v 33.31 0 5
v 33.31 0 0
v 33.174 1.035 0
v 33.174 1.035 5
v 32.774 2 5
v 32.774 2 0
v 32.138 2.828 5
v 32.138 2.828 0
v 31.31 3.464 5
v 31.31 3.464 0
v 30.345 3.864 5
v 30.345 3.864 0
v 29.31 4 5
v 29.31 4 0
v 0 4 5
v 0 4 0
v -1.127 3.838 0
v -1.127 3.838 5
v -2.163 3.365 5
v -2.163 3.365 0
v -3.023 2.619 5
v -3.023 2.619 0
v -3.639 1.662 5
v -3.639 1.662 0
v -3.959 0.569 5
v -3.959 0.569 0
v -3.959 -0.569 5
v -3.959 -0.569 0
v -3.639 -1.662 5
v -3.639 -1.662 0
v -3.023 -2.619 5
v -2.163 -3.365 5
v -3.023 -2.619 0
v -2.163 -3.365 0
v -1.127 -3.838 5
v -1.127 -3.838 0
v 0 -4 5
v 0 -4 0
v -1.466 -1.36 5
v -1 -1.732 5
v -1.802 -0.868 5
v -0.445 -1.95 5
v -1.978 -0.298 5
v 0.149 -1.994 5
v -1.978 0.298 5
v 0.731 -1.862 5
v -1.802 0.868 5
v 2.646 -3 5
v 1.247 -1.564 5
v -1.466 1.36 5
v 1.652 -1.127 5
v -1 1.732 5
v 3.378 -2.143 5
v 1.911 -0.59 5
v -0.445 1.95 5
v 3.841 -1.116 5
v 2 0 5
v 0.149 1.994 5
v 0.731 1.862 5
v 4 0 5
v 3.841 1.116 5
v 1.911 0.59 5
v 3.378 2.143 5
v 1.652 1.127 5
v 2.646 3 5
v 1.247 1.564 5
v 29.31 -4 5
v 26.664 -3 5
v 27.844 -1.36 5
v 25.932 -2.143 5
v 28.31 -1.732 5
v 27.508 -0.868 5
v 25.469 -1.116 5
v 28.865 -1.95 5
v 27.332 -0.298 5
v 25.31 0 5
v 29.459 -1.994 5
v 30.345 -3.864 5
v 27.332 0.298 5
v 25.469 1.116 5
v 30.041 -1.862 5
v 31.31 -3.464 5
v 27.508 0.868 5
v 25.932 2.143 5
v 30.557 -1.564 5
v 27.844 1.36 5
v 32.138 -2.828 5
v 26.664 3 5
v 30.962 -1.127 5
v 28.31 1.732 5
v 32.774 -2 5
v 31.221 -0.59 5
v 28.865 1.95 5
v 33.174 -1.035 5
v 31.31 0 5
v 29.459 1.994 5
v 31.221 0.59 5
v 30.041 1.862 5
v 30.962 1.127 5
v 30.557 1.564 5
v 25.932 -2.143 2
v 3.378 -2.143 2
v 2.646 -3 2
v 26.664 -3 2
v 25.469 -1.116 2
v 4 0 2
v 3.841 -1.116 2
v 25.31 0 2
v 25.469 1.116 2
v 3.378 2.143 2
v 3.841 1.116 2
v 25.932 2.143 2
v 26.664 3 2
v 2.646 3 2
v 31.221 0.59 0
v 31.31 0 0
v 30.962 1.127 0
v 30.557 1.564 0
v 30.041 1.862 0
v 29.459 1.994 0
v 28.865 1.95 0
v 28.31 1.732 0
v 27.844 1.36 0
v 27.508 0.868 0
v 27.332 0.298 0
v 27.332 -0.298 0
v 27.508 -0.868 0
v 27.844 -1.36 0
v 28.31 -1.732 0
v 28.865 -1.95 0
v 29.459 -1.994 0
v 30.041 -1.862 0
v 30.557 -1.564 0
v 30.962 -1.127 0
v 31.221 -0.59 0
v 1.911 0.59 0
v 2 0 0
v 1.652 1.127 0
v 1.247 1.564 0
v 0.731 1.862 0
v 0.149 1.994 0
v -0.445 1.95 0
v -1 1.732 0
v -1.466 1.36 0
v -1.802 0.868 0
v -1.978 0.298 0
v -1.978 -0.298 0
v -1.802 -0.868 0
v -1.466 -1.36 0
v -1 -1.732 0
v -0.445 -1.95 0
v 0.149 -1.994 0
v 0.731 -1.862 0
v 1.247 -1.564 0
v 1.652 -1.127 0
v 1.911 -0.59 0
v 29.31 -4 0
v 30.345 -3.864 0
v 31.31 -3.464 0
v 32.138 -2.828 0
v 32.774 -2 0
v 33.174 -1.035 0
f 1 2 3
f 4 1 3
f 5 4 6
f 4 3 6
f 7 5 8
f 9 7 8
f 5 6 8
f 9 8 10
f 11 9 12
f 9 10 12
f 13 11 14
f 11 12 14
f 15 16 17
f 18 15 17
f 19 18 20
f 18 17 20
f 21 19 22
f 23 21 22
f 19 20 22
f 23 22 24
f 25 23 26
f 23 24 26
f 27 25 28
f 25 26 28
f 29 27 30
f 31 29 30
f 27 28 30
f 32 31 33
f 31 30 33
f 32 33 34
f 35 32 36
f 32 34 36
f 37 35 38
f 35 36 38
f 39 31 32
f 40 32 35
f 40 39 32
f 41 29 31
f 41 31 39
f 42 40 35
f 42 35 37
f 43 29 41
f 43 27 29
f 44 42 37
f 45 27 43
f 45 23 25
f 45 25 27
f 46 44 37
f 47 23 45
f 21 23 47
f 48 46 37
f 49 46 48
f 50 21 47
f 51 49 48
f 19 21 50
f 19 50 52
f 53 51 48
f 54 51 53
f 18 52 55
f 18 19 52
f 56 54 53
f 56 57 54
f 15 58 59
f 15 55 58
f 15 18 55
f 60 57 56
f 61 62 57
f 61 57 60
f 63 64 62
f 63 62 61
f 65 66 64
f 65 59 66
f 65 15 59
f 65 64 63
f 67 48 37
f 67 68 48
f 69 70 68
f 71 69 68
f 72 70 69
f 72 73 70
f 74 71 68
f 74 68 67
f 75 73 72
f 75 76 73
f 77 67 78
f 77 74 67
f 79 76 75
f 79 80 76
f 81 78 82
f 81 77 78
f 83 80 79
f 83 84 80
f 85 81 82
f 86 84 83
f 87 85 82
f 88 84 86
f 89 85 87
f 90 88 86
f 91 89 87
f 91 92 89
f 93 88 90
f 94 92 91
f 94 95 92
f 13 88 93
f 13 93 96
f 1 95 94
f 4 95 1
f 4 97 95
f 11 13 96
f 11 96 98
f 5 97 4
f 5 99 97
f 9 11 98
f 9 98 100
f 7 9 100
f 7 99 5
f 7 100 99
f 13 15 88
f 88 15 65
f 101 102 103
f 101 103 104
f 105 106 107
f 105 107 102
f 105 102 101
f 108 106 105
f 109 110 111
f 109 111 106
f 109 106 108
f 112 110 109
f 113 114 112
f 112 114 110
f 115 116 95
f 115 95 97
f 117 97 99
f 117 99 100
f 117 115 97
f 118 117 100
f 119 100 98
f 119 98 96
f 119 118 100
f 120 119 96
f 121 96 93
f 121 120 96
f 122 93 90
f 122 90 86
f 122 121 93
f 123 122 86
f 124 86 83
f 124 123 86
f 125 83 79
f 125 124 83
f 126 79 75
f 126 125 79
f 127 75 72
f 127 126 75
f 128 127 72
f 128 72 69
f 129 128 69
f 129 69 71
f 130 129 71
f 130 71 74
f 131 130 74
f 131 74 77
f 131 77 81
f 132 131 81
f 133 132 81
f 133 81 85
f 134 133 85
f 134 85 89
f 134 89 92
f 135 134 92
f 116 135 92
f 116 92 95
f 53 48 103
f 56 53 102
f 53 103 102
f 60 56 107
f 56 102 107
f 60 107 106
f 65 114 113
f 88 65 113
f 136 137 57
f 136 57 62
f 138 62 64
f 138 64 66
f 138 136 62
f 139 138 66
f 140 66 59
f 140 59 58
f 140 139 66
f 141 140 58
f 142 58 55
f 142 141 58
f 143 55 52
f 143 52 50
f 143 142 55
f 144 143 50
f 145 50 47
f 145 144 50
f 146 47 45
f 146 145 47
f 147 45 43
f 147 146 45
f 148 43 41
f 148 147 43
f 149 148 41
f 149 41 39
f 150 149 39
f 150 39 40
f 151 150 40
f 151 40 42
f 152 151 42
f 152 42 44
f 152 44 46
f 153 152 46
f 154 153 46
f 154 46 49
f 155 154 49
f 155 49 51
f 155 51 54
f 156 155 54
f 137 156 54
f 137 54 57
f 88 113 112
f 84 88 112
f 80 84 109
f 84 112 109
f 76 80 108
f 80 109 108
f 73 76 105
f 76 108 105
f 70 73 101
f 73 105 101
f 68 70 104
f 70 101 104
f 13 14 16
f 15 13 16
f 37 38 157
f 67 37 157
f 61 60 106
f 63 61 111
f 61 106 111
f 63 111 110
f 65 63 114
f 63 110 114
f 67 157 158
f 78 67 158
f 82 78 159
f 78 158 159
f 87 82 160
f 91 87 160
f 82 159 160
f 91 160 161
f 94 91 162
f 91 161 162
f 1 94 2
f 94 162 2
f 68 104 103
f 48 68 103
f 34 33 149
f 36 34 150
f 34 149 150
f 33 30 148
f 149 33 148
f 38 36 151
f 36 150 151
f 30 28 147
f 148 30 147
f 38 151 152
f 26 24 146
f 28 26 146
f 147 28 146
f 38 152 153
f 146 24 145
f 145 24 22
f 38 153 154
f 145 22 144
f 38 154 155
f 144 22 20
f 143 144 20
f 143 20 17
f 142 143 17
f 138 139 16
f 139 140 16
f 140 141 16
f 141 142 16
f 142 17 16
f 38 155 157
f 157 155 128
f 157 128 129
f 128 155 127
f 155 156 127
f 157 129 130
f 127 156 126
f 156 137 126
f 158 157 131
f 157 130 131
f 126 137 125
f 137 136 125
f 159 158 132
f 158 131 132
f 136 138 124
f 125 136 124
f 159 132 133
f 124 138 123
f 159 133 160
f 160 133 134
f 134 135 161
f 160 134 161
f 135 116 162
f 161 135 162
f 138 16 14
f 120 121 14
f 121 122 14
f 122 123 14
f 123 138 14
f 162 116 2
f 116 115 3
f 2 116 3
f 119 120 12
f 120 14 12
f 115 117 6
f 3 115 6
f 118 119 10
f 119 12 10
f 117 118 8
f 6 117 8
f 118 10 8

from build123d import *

# Parameters (mm, degrees)
F0_R     = 2
F1_DEPTH = 5
F2_DEPTH = 2


with BuildPart() as f1:
    # F0 (on Top) → F1 (new body)
    with BuildSketch(Plane.XY):
        with BuildLine():
            ThreePointArc((2.645751, -3), (3.645751, -1.645751), (4, 0))
            ThreePointArc((4, 0), (3.645751, 1.645751), (2.645751, 3))
            ThreePointArc((2.645751, 3), (1.414214, 3.741657), (0, 4))
            ThreePointArc((0, 4), (-4, 0), (0, -4))
            ThreePointArc((0, -4), (1.414214, -3.741657), (2.645751, -3))
        make_face()
        Circle(F0_R, mode=Mode.SUBTRACT)
        with BuildLine():
            ThreePointArc((0, 4), (1.414214, 3.741657), (2.645751, 3))
            Line((2.645751, 3), (26.664249, 3))
            ThreePointArc((26.664249, 3), (27.895786, 3.741657), (29.31, 4))
            Line((29.31, 4), (0, 4))
        make_face()
        with BuildLine():
            Line((26.664249, -3), (2.645751, -3))
            ThreePointArc((2.645751, -3), (1.414214, -3.741657), (0, -4))
            Line((0, -4), (29.31, -4))
            ThreePointArc((29.31, -4), (27.895786, -3.741657), (26.664249, -3))
        make_face()
        with BuildLine():
            ThreePointArc((29.31, 4), (27.895786, 3.741657), (26.664249, 3))
            ThreePointArc((26.664249, 3), (25.31, 0), (26.664249, -3))
            ThreePointArc((26.664249, -3), (27.895786, -3.741657), (29.31, -4))
            ThreePointArc((29.31, -4), (32.138427, -2.828427), (33.31, 0))
            ThreePointArc((33.31, 0), (32.138427, 2.828427), (29.31, 4))
        make_face()
        with Locations((29.31, 0)):
            Circle(F0_R, mode=Mode.SUBTRACT)
    extrude(amount=F1_DEPTH)

    # F0 (on Top) → F2 (join)
    with BuildSketch(Plane.XY):
        with BuildLine():
            ThreePointArc((2.645751, -3), (3.645751, -1.645751), (4, 0))
            ThreePointArc((4, 0), (3.645751, 1.645751), (2.645751, 3))
            ThreePointArc((2.645751, 3), (1.414214, 3.741657), (0, 4))
            ThreePointArc((0, 4), (-4, 0), (0, -4))
            ThreePointArc((0, -4), (1.414214, -3.741657), (2.645751, -3))
        make_face()
        Circle(F0_R, mode=Mode.SUBTRACT)
        with BuildLine():
            ThreePointArc((0, 4), (1.414214, 3.741657), (2.645751, 3))
            Line((2.645751, 3), (26.664249, 3))
            ThreePointArc((26.664249, 3), (27.895786, 3.741657), (29.31, 4))
            Line((29.31, 4), (0, 4))
        make_face()
        with BuildLine():
            Line((26.664249, -3), (2.645751, -3))
            ThreePointArc((2.645751, -3), (1.414214, -3.741657), (0, -4))
            Line((0, -4), (29.31, -4))
            ThreePointArc((29.31, -4), (27.895786, -3.741657), (26.664249, -3))
        make_face()
        with BuildLine():
            ThreePointArc((29.31, 4), (27.895786, 3.741657), (26.664249, 3))
            ThreePointArc((26.664249, 3), (25.31, 0), (26.664249, -3))
            ThreePointArc((26.664249, -3), (27.895786, -3.741657), (29.31, -4))
            ThreePointArc((29.31, -4), (32.138427, -2.828427), (33.31, 0))
            ThreePointArc((33.31, 0), (32.138427, 2.828427), (29.31, 4))
        make_face()
        with Locations((29.31, 0)):
            Circle(F0_R, mode=Mode.SUBTRACT)
        with BuildLine():
            ThreePointArc((2.645751, 3), (3.645751, 1.645751), (4, 0))
            ThreePointArc((4, 0), (3.645751, -1.645751), (2.645751, -3))
            Line((2.645751, -3), (26.664249, -3))
            ThreePointArc((26.664249, -3), (25.31, 0), (26.664249, 3))
            Line((26.664249, 3), (2.645751, 3))
        make_face()
    extrude(amount=F2_DEPTH)


solid = f1.part
